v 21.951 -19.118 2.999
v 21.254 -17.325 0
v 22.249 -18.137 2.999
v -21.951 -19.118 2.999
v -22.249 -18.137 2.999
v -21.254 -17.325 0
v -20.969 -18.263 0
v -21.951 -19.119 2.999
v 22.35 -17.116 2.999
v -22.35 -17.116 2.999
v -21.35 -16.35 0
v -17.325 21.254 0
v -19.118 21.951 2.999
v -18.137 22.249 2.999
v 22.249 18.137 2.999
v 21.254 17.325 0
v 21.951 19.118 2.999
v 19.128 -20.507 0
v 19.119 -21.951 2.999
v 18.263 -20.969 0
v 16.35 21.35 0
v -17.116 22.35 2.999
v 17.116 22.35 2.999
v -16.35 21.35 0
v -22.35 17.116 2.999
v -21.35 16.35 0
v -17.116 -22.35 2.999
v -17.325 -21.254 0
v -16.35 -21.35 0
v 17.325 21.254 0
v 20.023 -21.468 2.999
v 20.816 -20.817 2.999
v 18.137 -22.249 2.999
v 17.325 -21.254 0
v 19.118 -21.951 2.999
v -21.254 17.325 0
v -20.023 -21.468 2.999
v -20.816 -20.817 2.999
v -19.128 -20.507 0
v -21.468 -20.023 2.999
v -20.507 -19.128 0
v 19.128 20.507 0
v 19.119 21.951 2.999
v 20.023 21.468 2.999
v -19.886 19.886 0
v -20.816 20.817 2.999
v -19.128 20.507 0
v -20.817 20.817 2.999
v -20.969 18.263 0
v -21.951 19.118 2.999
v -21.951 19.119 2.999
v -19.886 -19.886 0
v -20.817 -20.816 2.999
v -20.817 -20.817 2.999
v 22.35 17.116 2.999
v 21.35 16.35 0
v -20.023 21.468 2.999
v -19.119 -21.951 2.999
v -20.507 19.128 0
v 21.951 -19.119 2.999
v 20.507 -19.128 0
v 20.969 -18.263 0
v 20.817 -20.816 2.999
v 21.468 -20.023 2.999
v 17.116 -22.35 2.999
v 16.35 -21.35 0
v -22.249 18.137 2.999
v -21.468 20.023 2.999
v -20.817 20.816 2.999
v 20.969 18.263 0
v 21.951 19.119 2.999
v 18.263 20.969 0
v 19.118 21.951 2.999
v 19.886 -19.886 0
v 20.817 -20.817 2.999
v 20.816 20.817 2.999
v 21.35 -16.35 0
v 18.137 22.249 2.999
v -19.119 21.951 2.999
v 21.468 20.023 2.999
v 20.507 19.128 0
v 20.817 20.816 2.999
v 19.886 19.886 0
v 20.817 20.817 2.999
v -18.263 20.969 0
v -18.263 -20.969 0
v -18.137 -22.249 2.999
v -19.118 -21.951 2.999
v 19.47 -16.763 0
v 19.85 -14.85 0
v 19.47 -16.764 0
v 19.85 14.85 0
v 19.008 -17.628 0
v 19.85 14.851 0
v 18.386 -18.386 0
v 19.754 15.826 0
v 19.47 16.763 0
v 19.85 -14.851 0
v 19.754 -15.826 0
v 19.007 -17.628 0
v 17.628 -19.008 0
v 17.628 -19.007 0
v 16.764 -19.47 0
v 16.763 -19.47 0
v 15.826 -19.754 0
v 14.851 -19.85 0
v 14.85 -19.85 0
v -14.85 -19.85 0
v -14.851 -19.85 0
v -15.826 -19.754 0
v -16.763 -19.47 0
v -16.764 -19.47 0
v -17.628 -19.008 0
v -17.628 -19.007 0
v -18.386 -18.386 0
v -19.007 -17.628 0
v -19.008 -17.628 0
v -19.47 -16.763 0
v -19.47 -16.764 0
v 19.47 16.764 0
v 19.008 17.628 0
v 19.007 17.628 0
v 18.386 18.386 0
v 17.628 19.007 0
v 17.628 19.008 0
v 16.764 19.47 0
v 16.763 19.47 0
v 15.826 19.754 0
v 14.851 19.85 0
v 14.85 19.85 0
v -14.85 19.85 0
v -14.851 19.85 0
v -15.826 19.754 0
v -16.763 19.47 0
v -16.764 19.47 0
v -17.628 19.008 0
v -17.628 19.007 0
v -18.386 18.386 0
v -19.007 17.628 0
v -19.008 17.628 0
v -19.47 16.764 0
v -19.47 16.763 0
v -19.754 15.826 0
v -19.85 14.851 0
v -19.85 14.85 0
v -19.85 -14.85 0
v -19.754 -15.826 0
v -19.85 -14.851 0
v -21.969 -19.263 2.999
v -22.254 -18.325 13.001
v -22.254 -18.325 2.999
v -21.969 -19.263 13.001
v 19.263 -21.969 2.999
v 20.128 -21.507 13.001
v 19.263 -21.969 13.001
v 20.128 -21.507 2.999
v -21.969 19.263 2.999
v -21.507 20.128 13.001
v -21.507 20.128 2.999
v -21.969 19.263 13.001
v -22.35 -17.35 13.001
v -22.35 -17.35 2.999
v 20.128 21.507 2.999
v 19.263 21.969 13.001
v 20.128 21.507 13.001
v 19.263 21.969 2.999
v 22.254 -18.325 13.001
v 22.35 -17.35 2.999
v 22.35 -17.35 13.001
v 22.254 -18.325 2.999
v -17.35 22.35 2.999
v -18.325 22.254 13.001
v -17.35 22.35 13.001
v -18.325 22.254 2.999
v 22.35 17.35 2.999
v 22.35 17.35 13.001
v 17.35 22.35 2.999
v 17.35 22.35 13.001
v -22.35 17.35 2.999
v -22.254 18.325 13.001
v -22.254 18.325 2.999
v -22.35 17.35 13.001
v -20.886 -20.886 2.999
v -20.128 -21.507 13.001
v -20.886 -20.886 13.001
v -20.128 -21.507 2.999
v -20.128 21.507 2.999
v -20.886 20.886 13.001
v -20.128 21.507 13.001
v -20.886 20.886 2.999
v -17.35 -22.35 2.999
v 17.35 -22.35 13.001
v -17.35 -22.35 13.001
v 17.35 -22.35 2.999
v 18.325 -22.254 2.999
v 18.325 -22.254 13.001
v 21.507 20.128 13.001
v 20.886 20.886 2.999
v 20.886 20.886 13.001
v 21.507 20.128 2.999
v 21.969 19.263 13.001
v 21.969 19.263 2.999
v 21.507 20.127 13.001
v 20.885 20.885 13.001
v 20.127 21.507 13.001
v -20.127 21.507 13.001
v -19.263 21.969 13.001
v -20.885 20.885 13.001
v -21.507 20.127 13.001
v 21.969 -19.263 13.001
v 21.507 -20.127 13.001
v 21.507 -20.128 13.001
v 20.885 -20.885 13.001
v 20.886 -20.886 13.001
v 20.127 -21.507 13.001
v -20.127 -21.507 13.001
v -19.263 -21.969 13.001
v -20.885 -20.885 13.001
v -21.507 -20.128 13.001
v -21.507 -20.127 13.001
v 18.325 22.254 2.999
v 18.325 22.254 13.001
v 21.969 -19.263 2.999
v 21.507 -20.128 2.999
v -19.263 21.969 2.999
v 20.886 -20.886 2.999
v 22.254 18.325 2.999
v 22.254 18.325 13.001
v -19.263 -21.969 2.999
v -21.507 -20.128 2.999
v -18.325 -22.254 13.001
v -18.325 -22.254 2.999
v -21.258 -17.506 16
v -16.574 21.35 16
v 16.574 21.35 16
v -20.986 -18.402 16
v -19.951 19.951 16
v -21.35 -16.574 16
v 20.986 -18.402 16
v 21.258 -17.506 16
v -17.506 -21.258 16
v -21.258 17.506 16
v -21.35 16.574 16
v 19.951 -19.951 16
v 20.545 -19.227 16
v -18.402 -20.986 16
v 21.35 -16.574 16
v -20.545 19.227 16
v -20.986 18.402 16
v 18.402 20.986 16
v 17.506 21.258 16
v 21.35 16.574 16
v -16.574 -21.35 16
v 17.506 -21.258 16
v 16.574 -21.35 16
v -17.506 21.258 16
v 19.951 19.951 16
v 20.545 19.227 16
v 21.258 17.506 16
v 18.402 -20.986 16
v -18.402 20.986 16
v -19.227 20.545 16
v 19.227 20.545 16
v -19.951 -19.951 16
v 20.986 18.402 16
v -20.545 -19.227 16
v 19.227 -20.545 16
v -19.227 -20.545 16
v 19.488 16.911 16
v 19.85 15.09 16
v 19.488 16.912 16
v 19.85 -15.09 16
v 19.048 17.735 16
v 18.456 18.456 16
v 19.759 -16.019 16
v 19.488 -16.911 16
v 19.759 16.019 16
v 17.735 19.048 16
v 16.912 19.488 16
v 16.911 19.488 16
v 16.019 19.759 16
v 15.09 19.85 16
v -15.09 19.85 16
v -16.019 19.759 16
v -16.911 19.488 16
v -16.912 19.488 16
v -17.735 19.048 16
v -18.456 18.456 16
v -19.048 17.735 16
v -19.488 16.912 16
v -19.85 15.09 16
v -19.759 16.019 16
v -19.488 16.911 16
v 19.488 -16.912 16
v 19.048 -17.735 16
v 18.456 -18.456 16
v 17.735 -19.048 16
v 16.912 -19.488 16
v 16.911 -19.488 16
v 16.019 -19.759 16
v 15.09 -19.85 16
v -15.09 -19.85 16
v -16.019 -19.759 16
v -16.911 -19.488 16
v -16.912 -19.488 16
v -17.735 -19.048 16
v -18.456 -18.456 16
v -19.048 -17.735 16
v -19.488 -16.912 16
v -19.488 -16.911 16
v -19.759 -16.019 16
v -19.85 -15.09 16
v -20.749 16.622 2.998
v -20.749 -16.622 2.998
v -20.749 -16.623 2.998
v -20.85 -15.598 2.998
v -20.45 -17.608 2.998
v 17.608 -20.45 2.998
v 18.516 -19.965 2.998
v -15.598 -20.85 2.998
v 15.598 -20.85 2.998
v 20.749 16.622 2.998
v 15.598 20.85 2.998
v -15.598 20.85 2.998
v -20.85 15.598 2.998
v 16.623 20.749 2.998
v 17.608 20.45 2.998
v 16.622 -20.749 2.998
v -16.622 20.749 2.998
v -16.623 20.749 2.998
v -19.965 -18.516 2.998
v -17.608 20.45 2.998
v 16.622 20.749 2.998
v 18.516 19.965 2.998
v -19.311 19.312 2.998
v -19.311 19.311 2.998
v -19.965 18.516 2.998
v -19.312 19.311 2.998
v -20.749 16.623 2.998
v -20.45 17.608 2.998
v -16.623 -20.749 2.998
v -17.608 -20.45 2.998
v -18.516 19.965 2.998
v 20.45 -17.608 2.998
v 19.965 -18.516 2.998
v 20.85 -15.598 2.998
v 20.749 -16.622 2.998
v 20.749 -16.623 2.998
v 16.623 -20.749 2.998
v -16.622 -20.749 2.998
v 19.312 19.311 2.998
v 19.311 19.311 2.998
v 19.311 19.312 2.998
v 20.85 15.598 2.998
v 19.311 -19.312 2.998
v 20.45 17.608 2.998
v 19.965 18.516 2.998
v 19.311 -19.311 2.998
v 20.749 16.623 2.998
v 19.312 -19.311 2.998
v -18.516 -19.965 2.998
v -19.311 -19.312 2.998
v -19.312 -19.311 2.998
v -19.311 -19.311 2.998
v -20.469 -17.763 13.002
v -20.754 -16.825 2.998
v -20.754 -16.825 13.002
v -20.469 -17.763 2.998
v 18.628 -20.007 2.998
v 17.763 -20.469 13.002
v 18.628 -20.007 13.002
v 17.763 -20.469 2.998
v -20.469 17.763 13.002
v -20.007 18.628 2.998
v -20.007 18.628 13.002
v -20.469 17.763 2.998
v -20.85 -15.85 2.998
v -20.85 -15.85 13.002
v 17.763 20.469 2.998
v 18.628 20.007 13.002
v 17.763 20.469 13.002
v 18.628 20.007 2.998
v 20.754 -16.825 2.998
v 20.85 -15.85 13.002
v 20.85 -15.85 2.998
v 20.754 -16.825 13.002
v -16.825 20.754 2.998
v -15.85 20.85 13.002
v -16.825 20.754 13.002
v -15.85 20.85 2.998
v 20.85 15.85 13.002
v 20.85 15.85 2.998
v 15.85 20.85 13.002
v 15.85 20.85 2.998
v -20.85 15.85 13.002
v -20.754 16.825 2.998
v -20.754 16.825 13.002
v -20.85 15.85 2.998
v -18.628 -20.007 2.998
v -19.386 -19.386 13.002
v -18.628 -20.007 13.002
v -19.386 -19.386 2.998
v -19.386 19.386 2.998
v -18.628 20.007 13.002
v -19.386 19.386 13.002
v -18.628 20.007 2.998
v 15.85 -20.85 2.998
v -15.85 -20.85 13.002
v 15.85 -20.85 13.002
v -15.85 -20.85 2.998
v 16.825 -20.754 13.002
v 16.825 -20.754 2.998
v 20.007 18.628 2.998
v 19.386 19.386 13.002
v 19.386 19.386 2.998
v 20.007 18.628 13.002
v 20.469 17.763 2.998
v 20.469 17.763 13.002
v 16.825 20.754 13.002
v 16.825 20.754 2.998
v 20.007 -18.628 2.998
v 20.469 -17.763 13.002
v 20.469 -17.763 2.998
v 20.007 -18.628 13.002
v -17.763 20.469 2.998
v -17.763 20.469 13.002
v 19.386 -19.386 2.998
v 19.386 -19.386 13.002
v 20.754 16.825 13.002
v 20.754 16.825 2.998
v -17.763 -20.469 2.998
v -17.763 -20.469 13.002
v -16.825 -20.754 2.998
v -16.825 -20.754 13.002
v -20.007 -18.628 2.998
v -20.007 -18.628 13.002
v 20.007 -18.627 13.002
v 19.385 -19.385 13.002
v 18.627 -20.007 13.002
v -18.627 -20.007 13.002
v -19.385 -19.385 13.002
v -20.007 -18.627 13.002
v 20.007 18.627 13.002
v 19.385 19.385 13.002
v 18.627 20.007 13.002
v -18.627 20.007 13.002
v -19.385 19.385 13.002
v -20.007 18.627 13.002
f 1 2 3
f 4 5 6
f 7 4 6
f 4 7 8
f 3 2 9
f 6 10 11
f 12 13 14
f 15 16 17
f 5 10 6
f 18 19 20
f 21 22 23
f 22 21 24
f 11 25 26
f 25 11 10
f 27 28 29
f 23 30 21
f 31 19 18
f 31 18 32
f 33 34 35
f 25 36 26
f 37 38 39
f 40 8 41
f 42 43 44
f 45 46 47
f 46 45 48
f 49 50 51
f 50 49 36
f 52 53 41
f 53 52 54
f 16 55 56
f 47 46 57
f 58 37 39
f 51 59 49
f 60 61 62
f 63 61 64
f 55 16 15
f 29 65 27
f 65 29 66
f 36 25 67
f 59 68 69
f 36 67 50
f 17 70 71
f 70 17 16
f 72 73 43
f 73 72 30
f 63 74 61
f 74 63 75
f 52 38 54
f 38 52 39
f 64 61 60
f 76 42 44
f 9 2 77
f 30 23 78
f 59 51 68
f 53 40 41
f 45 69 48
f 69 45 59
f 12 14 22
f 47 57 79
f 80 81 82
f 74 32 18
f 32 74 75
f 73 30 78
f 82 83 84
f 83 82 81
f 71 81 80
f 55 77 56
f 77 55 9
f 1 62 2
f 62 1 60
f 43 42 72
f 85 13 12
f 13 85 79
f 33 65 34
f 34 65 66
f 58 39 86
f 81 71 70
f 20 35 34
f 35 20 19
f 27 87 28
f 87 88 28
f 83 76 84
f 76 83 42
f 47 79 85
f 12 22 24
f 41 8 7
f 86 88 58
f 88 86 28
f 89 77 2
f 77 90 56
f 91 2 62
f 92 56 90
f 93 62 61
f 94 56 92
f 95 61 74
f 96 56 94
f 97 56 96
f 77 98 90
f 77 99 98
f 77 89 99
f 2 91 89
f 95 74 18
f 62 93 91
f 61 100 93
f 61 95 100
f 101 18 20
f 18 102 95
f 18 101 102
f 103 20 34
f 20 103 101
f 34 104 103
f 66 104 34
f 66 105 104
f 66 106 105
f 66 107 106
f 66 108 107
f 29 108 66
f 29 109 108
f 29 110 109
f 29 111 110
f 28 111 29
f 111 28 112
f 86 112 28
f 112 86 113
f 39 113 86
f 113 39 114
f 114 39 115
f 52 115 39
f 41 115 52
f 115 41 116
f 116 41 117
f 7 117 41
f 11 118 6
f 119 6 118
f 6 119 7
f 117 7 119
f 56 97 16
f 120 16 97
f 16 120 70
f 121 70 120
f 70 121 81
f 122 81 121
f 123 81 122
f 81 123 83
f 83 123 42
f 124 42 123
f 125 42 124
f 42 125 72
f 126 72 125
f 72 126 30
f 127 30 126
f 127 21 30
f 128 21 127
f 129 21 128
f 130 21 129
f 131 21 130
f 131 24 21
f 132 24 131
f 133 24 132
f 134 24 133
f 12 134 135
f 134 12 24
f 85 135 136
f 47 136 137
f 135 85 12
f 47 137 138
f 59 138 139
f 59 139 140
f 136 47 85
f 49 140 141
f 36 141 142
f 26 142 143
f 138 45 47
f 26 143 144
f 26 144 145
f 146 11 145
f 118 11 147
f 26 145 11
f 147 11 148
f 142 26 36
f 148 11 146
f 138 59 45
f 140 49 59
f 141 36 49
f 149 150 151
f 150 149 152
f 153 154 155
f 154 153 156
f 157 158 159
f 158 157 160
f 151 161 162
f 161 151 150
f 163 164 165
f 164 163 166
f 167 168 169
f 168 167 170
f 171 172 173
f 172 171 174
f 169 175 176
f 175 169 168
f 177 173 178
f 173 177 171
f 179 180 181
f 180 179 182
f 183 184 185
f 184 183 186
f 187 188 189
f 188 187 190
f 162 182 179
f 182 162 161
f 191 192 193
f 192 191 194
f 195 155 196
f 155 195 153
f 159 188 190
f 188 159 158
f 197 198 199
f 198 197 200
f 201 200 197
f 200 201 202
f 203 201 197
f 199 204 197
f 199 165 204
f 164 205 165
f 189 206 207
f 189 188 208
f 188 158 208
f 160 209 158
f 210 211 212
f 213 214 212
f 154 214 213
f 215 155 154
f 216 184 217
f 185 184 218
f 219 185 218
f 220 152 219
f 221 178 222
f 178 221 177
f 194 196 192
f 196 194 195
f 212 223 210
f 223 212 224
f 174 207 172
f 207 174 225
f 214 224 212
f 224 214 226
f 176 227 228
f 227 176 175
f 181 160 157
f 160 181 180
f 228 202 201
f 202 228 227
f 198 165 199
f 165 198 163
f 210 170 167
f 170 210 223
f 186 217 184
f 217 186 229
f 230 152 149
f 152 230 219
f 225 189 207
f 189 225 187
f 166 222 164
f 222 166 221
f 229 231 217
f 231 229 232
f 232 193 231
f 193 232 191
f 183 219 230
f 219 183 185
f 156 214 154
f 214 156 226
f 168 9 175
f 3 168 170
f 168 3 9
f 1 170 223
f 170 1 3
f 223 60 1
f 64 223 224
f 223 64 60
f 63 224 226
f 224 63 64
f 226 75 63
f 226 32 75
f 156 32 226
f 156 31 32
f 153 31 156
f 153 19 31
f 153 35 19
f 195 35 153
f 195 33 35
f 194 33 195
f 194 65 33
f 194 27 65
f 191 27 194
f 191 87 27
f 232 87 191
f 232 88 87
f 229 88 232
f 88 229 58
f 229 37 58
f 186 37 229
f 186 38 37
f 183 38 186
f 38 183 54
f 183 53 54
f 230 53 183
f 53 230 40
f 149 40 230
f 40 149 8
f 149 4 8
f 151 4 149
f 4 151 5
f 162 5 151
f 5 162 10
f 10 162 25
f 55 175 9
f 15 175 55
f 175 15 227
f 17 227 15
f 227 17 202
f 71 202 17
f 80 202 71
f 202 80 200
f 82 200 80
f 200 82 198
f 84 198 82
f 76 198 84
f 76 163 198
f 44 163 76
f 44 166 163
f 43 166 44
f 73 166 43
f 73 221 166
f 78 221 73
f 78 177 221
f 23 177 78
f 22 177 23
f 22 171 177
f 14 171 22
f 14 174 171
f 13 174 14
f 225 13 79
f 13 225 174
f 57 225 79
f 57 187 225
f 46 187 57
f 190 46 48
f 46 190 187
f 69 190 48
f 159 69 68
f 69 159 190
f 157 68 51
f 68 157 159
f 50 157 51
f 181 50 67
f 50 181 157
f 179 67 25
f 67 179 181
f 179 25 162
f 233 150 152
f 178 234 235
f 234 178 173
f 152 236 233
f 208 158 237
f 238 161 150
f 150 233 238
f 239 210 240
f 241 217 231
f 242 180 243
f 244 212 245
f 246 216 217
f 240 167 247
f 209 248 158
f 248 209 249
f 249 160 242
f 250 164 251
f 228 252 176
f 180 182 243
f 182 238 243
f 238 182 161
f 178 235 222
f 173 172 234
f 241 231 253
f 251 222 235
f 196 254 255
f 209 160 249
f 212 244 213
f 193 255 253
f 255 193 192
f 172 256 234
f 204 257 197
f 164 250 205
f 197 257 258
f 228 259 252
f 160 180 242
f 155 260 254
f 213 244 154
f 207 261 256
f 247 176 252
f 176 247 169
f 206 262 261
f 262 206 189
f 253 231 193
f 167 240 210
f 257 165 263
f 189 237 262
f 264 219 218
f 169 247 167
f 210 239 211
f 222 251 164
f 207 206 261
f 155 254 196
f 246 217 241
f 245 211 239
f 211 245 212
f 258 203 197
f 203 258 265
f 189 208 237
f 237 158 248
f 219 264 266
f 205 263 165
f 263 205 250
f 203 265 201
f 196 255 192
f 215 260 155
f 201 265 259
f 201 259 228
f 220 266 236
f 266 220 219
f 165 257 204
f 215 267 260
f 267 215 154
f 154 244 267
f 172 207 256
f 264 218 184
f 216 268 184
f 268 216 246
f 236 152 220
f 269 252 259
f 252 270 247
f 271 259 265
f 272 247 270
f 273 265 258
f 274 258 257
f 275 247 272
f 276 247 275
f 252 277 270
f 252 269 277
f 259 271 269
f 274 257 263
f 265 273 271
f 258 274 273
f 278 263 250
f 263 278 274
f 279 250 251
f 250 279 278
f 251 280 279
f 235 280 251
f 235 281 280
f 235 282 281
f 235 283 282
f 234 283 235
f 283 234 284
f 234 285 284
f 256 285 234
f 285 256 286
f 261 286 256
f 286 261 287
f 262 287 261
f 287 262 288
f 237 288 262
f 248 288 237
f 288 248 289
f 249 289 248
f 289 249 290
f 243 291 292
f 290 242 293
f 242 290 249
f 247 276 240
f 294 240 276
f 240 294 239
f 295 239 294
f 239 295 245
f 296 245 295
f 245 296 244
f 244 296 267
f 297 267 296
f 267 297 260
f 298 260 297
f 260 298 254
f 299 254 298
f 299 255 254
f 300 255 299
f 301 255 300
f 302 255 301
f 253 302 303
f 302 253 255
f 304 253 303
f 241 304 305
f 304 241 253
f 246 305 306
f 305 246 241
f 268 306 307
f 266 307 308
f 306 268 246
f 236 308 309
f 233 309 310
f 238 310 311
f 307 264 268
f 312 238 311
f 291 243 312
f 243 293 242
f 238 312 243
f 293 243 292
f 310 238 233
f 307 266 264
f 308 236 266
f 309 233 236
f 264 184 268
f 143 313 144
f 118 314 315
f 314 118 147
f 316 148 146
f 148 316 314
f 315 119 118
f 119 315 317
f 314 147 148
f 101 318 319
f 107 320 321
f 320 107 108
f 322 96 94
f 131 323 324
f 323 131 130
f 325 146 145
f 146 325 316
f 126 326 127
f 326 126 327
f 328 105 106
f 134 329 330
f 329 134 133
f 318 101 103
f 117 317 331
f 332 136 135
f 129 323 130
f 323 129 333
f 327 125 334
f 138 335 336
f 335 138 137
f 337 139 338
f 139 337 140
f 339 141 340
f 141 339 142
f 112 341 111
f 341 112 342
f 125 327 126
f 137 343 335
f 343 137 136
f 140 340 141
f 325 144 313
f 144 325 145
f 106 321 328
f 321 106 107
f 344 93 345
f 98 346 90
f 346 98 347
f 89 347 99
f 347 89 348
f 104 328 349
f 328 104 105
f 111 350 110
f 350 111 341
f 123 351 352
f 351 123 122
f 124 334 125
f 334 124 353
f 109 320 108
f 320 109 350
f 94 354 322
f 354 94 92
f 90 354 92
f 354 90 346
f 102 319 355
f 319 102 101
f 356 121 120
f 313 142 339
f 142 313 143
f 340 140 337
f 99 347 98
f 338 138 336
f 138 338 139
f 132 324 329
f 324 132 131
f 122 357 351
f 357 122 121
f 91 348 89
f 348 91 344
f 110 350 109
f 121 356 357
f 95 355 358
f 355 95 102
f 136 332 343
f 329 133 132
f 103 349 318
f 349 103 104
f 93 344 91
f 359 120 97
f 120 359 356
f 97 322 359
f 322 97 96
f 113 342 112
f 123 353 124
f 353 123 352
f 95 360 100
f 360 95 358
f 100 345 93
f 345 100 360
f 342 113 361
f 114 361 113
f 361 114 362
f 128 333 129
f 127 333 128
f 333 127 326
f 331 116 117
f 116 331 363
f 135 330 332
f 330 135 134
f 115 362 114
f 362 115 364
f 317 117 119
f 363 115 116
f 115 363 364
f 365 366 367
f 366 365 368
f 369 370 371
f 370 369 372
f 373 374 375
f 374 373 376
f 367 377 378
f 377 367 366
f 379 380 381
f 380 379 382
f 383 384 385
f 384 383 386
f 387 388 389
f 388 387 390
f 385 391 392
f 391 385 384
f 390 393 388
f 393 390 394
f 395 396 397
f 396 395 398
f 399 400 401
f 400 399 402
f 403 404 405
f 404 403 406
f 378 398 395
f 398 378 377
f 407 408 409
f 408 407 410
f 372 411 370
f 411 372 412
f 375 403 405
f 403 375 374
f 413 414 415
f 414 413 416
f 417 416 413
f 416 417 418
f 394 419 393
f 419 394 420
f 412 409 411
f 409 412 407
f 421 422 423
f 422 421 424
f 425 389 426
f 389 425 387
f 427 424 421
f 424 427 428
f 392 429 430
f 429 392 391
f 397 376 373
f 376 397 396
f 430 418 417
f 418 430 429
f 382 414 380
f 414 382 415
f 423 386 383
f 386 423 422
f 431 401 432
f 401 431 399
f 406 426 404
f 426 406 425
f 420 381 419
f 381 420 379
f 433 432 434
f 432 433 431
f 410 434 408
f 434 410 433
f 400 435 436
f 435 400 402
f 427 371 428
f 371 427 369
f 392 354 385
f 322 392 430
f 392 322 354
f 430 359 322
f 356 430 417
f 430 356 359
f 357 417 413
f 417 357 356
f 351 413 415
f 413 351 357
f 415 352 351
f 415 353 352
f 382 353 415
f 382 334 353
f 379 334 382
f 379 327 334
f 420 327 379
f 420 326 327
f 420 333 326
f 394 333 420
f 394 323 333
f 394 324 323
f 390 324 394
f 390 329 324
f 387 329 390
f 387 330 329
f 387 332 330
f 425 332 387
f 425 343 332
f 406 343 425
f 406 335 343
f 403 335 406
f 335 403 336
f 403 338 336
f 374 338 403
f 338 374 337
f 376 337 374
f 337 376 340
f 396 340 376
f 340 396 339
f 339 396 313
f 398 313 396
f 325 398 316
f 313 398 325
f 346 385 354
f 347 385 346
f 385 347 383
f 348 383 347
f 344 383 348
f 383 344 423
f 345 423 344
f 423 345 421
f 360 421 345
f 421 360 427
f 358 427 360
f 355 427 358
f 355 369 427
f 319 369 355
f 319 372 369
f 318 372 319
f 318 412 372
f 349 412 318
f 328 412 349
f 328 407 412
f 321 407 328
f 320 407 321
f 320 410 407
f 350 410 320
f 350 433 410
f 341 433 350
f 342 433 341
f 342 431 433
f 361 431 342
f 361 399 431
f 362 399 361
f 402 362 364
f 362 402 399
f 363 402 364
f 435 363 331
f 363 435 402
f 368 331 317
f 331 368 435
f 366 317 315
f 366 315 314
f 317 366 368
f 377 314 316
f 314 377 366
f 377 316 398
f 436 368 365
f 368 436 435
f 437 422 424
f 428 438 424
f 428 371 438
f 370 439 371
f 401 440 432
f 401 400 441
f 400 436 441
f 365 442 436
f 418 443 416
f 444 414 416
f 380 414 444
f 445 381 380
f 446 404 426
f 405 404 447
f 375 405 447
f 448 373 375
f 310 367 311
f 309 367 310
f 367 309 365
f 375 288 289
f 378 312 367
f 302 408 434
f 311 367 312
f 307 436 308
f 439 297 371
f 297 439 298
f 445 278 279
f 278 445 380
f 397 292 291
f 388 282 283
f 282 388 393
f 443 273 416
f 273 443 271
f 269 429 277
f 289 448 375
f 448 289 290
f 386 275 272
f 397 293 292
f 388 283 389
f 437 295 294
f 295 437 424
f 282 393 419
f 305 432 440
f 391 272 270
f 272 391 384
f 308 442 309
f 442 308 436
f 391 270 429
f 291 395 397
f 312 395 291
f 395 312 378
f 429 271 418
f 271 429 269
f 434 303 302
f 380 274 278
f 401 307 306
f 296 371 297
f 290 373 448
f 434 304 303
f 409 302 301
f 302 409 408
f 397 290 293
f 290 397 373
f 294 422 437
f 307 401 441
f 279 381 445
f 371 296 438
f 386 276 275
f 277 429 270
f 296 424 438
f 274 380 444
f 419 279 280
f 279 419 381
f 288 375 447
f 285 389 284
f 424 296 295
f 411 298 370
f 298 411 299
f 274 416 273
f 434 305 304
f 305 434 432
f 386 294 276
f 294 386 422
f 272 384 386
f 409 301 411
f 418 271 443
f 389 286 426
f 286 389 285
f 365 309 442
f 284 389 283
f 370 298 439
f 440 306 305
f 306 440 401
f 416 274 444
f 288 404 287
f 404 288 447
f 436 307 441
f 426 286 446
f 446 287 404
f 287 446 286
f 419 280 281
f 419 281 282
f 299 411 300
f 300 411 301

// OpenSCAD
width = 45-.3;
corner = 5;
thickness = 1.5;
height = 10;
horizontalTaper = 1;
verticalTaper = 3;

nudge=0.001;

module mySquare(width) {
    $fn = 32;
    c = width/2-corner;
    hull() {
        translate([-c,-c]) circle(r=corner);
        translate([c,-c]) circle(r=corner);
        translate([-c,c]) circle(r=corner);
        translate([c,c]) circle(r=corner);
    }
}

module tapered(width=width,extra=0) {
    translate([0,0,-extra]) {
        linear_extrude(height=verticalTaper,scale=(width)/(width-2*horizontalTaper)) mySquare(width-2*horizontalTaper);
        translate([0,0,verticalTaper-nudge])
        linear_extrude(height=height+2*extra+2*nudge) mySquare(width);
        translate([0,0,verticalTaper+height+2*extra])
        linear_extrude(height=verticalTaper,scale=(width-2*horizontalTaper)/(width)) mySquare(width);
    }
}

render(convexity=2)
difference() {
    tapered();
    tapered(width=width-2*thickness,extra=nudge);
}
